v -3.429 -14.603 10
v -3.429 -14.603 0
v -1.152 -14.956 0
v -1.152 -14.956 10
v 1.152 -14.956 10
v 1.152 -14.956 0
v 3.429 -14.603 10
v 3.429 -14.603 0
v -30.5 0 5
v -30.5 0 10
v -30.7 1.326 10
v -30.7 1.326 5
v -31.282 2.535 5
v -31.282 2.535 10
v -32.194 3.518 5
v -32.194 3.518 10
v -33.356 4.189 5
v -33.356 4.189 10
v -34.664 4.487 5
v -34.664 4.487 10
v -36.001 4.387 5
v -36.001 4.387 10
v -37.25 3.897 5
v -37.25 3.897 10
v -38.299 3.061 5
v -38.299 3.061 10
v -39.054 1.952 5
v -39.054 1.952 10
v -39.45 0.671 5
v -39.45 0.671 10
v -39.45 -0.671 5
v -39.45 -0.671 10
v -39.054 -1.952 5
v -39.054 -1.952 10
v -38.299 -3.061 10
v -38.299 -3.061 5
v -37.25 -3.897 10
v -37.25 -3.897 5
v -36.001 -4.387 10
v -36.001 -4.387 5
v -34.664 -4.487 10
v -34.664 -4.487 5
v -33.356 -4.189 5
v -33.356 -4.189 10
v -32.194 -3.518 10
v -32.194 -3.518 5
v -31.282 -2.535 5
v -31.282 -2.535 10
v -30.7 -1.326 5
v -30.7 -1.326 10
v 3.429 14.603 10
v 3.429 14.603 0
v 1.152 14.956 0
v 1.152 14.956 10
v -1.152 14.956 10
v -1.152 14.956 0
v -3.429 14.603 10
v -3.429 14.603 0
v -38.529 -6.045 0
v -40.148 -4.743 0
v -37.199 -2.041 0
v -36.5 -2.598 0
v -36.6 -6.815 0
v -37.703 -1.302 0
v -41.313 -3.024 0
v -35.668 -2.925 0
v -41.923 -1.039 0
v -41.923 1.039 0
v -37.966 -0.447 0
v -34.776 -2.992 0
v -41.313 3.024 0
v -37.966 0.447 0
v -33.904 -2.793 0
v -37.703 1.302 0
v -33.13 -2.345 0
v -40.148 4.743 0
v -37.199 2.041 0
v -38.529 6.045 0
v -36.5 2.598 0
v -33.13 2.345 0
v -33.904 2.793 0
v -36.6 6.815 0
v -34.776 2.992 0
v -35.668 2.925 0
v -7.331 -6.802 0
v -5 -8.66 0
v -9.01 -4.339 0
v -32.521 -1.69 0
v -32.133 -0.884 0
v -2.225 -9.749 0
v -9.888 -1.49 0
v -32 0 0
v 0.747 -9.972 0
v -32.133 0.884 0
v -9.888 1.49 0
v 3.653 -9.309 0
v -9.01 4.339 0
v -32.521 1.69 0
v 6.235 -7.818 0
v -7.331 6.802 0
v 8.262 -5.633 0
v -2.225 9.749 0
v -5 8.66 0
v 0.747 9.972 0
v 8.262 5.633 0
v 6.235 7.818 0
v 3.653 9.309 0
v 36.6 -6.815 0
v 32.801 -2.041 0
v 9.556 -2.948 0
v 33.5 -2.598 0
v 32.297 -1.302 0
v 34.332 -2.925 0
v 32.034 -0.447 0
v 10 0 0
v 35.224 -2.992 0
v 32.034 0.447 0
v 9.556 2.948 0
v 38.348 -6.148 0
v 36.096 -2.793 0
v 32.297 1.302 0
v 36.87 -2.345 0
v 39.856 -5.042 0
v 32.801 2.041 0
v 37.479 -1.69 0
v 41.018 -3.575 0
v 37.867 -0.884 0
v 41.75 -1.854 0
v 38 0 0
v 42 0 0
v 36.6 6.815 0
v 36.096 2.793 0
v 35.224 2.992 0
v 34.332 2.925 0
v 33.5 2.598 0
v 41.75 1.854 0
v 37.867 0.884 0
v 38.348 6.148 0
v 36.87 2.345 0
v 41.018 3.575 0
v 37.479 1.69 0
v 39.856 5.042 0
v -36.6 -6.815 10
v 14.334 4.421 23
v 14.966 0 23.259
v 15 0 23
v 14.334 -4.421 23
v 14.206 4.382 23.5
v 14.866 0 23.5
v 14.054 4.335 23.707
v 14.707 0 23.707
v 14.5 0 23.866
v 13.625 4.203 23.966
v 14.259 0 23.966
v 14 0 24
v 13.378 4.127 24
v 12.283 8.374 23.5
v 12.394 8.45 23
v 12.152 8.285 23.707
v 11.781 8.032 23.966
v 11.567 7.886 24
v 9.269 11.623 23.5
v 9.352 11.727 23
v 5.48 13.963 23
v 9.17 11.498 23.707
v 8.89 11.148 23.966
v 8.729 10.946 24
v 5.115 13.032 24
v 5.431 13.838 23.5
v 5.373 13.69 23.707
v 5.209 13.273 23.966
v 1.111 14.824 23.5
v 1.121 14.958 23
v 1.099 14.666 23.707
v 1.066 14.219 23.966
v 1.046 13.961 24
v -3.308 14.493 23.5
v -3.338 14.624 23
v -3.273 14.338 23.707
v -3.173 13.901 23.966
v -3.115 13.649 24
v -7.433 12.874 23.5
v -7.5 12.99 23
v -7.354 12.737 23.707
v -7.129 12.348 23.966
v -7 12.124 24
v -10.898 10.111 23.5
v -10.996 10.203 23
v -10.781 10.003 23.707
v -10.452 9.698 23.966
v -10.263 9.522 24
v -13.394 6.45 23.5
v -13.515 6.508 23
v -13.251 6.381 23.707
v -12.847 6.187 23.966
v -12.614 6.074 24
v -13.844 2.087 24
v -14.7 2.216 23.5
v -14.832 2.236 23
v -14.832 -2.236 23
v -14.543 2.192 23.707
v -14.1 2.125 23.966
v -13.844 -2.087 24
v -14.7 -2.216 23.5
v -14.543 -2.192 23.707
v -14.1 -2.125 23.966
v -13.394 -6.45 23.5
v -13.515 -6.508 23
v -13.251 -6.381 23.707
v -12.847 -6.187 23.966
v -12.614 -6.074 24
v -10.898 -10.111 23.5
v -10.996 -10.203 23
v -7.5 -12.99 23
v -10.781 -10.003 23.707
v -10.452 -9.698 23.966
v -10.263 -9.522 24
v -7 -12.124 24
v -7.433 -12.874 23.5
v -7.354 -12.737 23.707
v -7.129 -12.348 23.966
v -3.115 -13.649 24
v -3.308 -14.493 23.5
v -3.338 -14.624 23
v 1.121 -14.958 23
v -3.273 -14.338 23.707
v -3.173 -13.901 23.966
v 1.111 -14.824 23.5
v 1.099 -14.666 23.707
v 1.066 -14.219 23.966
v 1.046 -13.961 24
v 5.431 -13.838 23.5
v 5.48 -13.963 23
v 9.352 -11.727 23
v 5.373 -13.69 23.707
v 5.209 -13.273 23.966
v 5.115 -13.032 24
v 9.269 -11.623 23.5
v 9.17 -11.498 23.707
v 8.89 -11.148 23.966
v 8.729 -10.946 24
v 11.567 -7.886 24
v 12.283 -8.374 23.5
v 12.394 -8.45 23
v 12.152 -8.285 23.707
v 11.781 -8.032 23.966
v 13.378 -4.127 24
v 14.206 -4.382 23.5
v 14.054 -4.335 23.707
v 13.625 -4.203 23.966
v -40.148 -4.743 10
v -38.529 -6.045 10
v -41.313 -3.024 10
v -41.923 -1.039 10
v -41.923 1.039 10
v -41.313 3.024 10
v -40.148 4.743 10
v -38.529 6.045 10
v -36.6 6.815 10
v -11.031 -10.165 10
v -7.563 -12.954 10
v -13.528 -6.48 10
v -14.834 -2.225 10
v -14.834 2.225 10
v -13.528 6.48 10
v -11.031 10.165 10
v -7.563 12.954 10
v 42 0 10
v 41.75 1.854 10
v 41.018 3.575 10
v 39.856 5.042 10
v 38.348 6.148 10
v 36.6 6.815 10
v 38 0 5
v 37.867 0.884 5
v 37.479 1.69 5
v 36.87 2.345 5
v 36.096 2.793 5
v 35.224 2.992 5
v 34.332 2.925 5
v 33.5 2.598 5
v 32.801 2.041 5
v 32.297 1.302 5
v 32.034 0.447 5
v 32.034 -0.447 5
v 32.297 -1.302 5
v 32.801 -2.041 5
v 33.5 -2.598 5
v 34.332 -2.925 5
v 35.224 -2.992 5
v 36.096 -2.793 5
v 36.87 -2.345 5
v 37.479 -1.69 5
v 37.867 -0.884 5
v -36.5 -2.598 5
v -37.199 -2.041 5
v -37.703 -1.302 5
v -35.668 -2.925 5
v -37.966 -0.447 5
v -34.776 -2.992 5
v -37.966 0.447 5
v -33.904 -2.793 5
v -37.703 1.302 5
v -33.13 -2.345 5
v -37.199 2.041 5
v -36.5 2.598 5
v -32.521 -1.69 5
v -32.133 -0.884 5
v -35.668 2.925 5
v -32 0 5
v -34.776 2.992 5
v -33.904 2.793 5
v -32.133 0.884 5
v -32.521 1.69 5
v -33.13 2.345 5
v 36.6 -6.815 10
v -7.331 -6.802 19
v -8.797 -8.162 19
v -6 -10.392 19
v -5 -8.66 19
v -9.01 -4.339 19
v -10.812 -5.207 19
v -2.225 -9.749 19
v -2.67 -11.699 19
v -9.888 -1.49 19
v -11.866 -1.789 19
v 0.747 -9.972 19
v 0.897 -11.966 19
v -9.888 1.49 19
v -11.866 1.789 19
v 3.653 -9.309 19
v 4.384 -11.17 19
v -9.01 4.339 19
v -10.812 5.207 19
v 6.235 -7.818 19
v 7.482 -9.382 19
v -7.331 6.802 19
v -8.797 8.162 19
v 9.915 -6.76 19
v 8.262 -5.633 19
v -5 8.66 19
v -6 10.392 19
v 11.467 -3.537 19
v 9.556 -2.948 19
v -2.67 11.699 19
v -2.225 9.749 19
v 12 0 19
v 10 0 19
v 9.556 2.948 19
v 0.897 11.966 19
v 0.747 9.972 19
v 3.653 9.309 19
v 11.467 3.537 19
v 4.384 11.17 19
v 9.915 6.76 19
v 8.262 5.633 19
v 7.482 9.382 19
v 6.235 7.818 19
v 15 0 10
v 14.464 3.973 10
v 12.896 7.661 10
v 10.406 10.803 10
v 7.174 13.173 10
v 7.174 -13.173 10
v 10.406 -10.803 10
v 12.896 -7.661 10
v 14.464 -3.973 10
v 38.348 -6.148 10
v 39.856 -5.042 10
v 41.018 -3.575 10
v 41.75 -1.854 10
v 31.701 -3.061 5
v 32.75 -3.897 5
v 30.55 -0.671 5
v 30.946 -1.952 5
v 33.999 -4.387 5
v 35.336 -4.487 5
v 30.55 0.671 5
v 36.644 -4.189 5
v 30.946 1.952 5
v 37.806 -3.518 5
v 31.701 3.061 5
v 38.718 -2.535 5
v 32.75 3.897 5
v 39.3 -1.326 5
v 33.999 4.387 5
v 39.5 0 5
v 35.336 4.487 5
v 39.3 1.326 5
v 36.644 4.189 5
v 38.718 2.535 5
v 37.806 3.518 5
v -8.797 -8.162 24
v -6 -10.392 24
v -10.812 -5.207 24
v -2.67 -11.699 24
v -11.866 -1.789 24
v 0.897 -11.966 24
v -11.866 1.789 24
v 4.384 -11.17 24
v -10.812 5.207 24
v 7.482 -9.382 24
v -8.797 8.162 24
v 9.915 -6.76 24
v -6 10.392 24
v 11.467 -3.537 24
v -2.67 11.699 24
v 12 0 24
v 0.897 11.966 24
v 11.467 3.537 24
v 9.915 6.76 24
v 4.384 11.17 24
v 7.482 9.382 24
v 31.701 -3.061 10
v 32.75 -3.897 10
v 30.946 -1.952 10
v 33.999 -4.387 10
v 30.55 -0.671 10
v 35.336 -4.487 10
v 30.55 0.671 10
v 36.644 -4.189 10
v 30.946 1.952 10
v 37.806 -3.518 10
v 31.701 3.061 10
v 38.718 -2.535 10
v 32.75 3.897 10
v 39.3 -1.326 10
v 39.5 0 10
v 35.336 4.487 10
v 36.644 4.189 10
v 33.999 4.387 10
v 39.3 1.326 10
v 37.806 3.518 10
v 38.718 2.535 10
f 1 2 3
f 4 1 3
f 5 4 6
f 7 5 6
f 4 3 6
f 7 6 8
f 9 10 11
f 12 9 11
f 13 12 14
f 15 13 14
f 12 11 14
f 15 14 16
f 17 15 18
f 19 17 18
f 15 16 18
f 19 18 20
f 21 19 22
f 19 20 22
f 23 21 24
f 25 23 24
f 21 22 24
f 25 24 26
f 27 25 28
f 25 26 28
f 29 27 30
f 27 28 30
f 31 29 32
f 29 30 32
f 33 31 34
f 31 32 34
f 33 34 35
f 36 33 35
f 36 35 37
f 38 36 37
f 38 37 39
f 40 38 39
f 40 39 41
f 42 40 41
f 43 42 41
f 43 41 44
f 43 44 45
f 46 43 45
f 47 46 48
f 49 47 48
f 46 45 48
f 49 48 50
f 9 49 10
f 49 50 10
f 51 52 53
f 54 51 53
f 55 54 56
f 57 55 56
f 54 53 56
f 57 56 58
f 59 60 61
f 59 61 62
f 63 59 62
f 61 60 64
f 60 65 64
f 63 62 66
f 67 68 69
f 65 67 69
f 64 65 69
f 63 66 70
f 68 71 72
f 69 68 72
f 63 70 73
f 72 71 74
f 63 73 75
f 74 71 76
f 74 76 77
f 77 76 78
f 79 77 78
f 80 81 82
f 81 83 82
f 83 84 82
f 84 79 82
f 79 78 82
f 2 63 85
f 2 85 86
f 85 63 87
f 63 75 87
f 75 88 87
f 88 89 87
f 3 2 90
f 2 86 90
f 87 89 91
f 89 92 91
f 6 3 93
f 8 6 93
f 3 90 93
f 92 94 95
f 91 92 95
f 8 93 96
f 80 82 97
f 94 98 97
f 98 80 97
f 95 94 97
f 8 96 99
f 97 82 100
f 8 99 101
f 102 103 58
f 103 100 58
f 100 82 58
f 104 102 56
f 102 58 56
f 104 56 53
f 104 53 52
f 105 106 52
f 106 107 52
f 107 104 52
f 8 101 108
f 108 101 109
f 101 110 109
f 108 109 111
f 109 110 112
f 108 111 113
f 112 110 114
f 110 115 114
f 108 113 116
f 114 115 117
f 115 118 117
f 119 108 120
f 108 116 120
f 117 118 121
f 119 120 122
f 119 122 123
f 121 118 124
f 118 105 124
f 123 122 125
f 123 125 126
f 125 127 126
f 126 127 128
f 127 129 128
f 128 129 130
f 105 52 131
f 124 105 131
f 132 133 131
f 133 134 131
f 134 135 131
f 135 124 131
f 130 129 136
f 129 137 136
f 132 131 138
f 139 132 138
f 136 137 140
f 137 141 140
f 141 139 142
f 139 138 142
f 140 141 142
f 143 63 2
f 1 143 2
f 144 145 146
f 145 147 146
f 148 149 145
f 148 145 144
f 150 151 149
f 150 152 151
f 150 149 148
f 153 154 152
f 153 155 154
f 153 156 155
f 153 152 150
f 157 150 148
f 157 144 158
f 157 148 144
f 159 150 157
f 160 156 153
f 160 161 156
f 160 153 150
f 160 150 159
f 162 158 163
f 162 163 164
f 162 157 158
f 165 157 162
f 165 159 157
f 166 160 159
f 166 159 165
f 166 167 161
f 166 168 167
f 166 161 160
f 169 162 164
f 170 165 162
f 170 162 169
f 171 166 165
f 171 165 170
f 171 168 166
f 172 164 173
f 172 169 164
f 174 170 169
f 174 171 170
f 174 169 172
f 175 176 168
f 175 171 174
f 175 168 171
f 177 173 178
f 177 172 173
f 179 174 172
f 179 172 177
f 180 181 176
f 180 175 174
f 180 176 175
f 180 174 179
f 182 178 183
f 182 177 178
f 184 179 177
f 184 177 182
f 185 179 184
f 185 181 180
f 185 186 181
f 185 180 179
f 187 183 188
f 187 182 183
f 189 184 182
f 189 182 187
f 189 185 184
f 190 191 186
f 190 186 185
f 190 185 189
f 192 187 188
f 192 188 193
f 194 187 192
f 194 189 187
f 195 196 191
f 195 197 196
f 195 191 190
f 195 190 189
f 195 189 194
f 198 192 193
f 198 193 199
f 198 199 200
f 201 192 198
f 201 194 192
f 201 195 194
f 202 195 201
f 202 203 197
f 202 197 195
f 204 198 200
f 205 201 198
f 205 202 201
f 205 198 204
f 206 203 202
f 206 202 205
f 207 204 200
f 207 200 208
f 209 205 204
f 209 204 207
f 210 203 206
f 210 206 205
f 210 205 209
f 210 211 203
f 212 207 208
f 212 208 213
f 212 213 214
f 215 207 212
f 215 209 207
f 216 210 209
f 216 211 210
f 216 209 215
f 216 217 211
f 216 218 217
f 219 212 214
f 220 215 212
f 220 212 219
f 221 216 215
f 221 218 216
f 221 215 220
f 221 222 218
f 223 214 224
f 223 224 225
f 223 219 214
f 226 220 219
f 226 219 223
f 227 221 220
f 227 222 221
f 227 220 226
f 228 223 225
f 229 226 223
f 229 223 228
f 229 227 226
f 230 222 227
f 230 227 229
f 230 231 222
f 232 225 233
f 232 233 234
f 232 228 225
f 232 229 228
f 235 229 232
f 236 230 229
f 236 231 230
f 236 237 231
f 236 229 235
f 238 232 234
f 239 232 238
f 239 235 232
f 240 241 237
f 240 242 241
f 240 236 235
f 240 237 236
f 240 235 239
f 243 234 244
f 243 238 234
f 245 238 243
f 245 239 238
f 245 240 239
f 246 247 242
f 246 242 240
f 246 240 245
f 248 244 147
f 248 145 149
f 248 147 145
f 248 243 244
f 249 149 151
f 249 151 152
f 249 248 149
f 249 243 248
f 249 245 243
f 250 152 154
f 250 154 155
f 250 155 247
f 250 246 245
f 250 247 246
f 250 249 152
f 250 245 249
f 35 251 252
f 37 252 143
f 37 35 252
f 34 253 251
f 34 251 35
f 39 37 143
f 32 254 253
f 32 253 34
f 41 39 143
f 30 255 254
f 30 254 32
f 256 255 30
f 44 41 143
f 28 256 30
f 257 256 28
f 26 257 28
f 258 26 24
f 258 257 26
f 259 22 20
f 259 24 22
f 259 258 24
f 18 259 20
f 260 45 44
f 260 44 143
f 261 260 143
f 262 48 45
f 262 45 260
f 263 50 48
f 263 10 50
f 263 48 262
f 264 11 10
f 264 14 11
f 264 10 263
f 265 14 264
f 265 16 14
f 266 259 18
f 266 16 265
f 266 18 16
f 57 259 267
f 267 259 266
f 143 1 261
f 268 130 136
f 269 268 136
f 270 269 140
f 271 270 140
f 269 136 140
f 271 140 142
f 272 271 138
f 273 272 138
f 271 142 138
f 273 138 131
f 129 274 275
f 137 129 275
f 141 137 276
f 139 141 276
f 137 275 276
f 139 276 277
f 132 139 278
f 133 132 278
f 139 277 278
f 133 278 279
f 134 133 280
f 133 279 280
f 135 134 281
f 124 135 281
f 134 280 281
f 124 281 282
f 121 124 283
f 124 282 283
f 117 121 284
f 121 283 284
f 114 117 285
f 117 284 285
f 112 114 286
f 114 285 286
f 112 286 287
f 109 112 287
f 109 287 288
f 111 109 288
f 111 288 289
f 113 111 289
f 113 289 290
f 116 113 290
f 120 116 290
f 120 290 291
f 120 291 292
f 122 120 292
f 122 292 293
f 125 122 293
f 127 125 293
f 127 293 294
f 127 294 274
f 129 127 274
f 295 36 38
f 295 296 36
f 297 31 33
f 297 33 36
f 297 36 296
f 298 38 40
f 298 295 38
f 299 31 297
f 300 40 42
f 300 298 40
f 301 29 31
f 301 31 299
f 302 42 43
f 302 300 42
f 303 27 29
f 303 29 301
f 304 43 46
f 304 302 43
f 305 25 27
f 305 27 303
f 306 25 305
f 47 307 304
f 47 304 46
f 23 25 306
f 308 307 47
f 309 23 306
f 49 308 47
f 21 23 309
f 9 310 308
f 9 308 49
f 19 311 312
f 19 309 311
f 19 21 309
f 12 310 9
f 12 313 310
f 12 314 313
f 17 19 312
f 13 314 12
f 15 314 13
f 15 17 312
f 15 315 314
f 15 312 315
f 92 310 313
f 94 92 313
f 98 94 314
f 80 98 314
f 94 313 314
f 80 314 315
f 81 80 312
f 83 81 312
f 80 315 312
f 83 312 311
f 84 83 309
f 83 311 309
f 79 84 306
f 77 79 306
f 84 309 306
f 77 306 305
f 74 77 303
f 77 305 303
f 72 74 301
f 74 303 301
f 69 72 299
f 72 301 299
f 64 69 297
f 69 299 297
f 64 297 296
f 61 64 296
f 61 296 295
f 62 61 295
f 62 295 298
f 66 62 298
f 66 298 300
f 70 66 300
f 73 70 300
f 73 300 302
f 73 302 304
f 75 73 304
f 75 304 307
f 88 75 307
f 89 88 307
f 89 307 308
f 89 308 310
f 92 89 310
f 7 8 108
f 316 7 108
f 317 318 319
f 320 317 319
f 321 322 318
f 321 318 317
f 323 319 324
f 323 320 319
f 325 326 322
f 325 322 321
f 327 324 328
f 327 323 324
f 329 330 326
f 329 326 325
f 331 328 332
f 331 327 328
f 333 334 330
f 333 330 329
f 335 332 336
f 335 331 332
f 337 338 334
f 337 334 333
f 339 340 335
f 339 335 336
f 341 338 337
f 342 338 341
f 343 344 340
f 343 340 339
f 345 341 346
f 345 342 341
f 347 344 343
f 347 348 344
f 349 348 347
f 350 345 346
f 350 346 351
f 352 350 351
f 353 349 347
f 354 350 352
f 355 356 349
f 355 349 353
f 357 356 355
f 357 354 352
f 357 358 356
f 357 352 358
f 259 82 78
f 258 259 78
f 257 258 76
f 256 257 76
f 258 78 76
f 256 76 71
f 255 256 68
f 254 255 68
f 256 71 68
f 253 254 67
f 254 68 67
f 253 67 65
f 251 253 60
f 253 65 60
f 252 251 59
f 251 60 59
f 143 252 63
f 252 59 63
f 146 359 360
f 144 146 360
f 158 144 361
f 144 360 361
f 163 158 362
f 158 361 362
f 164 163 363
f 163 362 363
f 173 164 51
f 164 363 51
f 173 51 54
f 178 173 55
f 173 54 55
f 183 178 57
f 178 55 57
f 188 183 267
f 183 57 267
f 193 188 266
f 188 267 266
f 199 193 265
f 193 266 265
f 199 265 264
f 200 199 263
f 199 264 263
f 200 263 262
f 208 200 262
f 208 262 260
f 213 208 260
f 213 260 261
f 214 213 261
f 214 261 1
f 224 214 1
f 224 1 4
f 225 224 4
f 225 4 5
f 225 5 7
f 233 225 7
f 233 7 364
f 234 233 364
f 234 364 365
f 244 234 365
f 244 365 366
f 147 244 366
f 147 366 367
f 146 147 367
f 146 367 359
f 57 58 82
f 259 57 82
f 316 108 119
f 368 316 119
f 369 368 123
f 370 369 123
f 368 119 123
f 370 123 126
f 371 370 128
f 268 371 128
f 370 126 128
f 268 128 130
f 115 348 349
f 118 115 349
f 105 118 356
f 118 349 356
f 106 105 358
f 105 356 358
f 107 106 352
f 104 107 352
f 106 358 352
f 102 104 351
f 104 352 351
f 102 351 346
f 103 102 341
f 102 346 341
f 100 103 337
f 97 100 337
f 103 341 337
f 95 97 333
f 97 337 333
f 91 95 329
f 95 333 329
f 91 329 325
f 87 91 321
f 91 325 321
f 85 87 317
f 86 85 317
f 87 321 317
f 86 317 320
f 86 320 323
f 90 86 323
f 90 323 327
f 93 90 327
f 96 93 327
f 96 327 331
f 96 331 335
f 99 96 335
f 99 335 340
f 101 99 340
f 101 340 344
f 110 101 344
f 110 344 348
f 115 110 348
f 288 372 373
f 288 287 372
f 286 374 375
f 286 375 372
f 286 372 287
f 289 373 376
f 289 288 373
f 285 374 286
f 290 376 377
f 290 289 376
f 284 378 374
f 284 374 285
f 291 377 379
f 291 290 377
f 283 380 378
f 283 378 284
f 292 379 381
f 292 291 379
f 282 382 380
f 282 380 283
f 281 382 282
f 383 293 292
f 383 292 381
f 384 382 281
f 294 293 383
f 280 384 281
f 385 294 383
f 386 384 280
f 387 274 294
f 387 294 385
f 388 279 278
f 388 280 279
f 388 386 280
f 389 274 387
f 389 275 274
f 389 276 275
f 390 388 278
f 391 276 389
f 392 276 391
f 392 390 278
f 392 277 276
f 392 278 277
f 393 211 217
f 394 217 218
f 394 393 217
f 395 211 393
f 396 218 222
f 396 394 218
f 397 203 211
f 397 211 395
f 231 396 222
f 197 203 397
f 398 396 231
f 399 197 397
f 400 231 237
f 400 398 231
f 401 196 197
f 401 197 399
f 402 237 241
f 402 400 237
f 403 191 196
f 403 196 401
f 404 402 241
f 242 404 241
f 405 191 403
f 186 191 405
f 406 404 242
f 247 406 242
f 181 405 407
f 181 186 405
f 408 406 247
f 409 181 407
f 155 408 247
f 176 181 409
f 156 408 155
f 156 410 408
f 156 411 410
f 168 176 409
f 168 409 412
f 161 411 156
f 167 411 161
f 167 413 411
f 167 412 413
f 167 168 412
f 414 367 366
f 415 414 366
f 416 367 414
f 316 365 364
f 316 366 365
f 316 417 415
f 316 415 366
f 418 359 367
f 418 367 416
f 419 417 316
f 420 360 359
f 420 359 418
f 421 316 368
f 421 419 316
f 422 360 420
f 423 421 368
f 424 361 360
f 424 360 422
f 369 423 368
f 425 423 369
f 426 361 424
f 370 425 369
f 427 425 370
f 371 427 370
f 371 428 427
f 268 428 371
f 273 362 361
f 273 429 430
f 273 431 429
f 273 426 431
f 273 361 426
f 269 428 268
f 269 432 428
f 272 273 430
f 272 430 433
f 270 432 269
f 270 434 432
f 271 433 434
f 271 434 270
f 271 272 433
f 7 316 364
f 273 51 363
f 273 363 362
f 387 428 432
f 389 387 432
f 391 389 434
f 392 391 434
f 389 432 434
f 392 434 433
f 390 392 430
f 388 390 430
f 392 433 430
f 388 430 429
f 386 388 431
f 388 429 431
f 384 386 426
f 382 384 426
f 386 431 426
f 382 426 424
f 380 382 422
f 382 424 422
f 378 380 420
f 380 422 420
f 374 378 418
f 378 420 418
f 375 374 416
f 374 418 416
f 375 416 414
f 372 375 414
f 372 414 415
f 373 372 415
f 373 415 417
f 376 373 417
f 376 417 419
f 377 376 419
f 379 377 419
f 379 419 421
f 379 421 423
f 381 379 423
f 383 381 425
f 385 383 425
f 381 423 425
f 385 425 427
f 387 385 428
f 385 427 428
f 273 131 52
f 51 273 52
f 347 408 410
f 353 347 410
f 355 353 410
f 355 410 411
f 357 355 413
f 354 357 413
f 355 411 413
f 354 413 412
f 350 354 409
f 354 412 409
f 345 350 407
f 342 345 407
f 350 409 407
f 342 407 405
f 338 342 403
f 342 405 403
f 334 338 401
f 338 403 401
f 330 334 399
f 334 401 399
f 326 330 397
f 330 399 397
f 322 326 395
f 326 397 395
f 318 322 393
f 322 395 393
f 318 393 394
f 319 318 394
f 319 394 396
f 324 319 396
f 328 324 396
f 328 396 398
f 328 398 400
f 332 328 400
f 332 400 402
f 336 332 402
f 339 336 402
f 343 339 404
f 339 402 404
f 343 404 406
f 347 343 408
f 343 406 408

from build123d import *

# Parameters (mm, degrees)
F1_DEPTH  = 10
F2_R      = 15
F3_DEPTH  = 14
F4_R      = 4.5
F5_DEPTH  = 5
F7_R      = 3
F8_DEPTH  = 27.2
F10_R     = 12
F11_DEPTH = 5
F13_R     = 10
F14_DEPTH = 25
F16_R     = 1


with BuildPart() as f1:
    # F0 (on Top) → F1 (new body)
    with BuildSketch(Plane.XY):
        with BuildLine():
            ThreePointArc((3.428571, -14.602907), (11.756457, -9.315885), (15, 0))
            ThreePointArc((15, 0), (11.756457, 9.315885), (3.428571, 14.602907))
            ThreePointArc((3.428571, 14.602907), (0, 15), (-3.428571, 14.602907))
            ThreePointArc((-3.428571, 14.602907), (-15, 0), (-3.428571, -14.602907))
            ThreePointArc((-3.428571, -14.602907), (0, -15), (3.428571, -14.602907))
        make_face()
        with BuildLine():
            ThreePointArc((3.428571, 14.602907), (11.756457, 9.315885), (15, 0))
            ThreePointArc((15, 0), (11.756457, -9.315885), (3.428571, -14.602907))
            Line((3.428571, -14.602907), (36.6, -6.81469))
            ThreePointArc((36.6, -6.81469), (28, 0), (36.6, 6.81469))
            Line((36.6, 6.81469), (3.428571, 14.602907))
        make_face()
        with BuildLine():
            ThreePointArc((-3.428571, -14.602907), (-15, 0), (-3.428571, 14.602907))
            Line((-3.428571, 14.602907), (-36.6, 6.81469))
            ThreePointArc((-36.6, 6.81469), (-30.652587, 5.486347), (-28, 0))
            ThreePointArc((-28, 0), (-30.652587, -5.486347), (-36.6, -6.81469))
            Line((-36.6, -6.81469), (-3.428571, -14.602907))
        make_face()
        with BuildLine():
            ThreePointArc((42, 0), (40.486347, 4.347413), (36.6, 6.81469))
            ThreePointArc((36.6, 6.81469), (28, 0), (36.6, -6.81469))
            ThreePointArc((36.6, -6.81469), (40.486347, -4.347413), (42, 0))
        make_face()
        with BuildLine():
            ThreePointArc((-28, 0), (-30.652587, 5.486347), (-36.6, 6.81469))
            ThreePointArc((-36.6, 6.81469), (-42, 0), (-36.6, -6.81469))
            ThreePointArc((-36.6, -6.81469), (-30.652587, -5.486347), (-28, 0))
        make_face()
    extrude(amount=F1_DEPTH)

    # F2 (on face) → F3 (join)
    with BuildSketch(Plane.XY.offset(10)):
        Circle(F2_R)
    extrude(amount=F3_DEPTH)


with BuildPart() as f5:
    # F4 (on face) → F5 (new body)
    with BuildSketch(Plane.XY.offset(10)):
        with Locations((-35, 0)):
            Circle(F4_R)
        with Locations((35, 0)):
            Circle(F4_R)
    extrude(amount=-F5_DEPTH)


with BuildPart() as f1_1:
    add(f1.part)

    # F6: cut F5
    add(f5.part, mode=Mode.SUBTRACT)


with BuildPart() as f8:
    # F7 (on face) → F8 (new body)
    with BuildSketch(Plane.XY.offset(5)):
        with Locations((-35, 0)):
            Circle(F7_R)
        with Locations((35, 0)):
            Circle(F7_R)
    extrude(amount=-F8_DEPTH)


with BuildPart() as f1_2:
    add(f1_1.part)

    # F9: cut F8
    add(f8.part, mode=Mode.SUBTRACT)


with BuildPart() as f11:
    # F10 (on face) → F11 (new body)
    with BuildSketch(Plane.XY.offset(24)):
        Circle(F10_R)
    extrude(amount=-F11_DEPTH)


with BuildPart() as f1_3:
    add(f1_2.part)

    # F12: cut F11
    add(f11.part, mode=Mode.SUBTRACT)


with BuildPart() as f14:
    # F13 (on face) → F14 (new body)
    with BuildSketch(Plane.XY.offset(19)):
        Circle(F13_R)
    extrude(amount=-F14_DEPTH)


with BuildPart() as f1_4:
    add(f1_3.part)

    # F15: cut F14
    add(f14.part, mode=Mode.SUBTRACT)

    # F16
    f16_edges = [f1_4.edges().sort_by_distance(p)[0] for p in [
        (-15, 0, 24),
    ]]
    fillet(f16_edges, radius=F16_R)


solid = f1_4.part
